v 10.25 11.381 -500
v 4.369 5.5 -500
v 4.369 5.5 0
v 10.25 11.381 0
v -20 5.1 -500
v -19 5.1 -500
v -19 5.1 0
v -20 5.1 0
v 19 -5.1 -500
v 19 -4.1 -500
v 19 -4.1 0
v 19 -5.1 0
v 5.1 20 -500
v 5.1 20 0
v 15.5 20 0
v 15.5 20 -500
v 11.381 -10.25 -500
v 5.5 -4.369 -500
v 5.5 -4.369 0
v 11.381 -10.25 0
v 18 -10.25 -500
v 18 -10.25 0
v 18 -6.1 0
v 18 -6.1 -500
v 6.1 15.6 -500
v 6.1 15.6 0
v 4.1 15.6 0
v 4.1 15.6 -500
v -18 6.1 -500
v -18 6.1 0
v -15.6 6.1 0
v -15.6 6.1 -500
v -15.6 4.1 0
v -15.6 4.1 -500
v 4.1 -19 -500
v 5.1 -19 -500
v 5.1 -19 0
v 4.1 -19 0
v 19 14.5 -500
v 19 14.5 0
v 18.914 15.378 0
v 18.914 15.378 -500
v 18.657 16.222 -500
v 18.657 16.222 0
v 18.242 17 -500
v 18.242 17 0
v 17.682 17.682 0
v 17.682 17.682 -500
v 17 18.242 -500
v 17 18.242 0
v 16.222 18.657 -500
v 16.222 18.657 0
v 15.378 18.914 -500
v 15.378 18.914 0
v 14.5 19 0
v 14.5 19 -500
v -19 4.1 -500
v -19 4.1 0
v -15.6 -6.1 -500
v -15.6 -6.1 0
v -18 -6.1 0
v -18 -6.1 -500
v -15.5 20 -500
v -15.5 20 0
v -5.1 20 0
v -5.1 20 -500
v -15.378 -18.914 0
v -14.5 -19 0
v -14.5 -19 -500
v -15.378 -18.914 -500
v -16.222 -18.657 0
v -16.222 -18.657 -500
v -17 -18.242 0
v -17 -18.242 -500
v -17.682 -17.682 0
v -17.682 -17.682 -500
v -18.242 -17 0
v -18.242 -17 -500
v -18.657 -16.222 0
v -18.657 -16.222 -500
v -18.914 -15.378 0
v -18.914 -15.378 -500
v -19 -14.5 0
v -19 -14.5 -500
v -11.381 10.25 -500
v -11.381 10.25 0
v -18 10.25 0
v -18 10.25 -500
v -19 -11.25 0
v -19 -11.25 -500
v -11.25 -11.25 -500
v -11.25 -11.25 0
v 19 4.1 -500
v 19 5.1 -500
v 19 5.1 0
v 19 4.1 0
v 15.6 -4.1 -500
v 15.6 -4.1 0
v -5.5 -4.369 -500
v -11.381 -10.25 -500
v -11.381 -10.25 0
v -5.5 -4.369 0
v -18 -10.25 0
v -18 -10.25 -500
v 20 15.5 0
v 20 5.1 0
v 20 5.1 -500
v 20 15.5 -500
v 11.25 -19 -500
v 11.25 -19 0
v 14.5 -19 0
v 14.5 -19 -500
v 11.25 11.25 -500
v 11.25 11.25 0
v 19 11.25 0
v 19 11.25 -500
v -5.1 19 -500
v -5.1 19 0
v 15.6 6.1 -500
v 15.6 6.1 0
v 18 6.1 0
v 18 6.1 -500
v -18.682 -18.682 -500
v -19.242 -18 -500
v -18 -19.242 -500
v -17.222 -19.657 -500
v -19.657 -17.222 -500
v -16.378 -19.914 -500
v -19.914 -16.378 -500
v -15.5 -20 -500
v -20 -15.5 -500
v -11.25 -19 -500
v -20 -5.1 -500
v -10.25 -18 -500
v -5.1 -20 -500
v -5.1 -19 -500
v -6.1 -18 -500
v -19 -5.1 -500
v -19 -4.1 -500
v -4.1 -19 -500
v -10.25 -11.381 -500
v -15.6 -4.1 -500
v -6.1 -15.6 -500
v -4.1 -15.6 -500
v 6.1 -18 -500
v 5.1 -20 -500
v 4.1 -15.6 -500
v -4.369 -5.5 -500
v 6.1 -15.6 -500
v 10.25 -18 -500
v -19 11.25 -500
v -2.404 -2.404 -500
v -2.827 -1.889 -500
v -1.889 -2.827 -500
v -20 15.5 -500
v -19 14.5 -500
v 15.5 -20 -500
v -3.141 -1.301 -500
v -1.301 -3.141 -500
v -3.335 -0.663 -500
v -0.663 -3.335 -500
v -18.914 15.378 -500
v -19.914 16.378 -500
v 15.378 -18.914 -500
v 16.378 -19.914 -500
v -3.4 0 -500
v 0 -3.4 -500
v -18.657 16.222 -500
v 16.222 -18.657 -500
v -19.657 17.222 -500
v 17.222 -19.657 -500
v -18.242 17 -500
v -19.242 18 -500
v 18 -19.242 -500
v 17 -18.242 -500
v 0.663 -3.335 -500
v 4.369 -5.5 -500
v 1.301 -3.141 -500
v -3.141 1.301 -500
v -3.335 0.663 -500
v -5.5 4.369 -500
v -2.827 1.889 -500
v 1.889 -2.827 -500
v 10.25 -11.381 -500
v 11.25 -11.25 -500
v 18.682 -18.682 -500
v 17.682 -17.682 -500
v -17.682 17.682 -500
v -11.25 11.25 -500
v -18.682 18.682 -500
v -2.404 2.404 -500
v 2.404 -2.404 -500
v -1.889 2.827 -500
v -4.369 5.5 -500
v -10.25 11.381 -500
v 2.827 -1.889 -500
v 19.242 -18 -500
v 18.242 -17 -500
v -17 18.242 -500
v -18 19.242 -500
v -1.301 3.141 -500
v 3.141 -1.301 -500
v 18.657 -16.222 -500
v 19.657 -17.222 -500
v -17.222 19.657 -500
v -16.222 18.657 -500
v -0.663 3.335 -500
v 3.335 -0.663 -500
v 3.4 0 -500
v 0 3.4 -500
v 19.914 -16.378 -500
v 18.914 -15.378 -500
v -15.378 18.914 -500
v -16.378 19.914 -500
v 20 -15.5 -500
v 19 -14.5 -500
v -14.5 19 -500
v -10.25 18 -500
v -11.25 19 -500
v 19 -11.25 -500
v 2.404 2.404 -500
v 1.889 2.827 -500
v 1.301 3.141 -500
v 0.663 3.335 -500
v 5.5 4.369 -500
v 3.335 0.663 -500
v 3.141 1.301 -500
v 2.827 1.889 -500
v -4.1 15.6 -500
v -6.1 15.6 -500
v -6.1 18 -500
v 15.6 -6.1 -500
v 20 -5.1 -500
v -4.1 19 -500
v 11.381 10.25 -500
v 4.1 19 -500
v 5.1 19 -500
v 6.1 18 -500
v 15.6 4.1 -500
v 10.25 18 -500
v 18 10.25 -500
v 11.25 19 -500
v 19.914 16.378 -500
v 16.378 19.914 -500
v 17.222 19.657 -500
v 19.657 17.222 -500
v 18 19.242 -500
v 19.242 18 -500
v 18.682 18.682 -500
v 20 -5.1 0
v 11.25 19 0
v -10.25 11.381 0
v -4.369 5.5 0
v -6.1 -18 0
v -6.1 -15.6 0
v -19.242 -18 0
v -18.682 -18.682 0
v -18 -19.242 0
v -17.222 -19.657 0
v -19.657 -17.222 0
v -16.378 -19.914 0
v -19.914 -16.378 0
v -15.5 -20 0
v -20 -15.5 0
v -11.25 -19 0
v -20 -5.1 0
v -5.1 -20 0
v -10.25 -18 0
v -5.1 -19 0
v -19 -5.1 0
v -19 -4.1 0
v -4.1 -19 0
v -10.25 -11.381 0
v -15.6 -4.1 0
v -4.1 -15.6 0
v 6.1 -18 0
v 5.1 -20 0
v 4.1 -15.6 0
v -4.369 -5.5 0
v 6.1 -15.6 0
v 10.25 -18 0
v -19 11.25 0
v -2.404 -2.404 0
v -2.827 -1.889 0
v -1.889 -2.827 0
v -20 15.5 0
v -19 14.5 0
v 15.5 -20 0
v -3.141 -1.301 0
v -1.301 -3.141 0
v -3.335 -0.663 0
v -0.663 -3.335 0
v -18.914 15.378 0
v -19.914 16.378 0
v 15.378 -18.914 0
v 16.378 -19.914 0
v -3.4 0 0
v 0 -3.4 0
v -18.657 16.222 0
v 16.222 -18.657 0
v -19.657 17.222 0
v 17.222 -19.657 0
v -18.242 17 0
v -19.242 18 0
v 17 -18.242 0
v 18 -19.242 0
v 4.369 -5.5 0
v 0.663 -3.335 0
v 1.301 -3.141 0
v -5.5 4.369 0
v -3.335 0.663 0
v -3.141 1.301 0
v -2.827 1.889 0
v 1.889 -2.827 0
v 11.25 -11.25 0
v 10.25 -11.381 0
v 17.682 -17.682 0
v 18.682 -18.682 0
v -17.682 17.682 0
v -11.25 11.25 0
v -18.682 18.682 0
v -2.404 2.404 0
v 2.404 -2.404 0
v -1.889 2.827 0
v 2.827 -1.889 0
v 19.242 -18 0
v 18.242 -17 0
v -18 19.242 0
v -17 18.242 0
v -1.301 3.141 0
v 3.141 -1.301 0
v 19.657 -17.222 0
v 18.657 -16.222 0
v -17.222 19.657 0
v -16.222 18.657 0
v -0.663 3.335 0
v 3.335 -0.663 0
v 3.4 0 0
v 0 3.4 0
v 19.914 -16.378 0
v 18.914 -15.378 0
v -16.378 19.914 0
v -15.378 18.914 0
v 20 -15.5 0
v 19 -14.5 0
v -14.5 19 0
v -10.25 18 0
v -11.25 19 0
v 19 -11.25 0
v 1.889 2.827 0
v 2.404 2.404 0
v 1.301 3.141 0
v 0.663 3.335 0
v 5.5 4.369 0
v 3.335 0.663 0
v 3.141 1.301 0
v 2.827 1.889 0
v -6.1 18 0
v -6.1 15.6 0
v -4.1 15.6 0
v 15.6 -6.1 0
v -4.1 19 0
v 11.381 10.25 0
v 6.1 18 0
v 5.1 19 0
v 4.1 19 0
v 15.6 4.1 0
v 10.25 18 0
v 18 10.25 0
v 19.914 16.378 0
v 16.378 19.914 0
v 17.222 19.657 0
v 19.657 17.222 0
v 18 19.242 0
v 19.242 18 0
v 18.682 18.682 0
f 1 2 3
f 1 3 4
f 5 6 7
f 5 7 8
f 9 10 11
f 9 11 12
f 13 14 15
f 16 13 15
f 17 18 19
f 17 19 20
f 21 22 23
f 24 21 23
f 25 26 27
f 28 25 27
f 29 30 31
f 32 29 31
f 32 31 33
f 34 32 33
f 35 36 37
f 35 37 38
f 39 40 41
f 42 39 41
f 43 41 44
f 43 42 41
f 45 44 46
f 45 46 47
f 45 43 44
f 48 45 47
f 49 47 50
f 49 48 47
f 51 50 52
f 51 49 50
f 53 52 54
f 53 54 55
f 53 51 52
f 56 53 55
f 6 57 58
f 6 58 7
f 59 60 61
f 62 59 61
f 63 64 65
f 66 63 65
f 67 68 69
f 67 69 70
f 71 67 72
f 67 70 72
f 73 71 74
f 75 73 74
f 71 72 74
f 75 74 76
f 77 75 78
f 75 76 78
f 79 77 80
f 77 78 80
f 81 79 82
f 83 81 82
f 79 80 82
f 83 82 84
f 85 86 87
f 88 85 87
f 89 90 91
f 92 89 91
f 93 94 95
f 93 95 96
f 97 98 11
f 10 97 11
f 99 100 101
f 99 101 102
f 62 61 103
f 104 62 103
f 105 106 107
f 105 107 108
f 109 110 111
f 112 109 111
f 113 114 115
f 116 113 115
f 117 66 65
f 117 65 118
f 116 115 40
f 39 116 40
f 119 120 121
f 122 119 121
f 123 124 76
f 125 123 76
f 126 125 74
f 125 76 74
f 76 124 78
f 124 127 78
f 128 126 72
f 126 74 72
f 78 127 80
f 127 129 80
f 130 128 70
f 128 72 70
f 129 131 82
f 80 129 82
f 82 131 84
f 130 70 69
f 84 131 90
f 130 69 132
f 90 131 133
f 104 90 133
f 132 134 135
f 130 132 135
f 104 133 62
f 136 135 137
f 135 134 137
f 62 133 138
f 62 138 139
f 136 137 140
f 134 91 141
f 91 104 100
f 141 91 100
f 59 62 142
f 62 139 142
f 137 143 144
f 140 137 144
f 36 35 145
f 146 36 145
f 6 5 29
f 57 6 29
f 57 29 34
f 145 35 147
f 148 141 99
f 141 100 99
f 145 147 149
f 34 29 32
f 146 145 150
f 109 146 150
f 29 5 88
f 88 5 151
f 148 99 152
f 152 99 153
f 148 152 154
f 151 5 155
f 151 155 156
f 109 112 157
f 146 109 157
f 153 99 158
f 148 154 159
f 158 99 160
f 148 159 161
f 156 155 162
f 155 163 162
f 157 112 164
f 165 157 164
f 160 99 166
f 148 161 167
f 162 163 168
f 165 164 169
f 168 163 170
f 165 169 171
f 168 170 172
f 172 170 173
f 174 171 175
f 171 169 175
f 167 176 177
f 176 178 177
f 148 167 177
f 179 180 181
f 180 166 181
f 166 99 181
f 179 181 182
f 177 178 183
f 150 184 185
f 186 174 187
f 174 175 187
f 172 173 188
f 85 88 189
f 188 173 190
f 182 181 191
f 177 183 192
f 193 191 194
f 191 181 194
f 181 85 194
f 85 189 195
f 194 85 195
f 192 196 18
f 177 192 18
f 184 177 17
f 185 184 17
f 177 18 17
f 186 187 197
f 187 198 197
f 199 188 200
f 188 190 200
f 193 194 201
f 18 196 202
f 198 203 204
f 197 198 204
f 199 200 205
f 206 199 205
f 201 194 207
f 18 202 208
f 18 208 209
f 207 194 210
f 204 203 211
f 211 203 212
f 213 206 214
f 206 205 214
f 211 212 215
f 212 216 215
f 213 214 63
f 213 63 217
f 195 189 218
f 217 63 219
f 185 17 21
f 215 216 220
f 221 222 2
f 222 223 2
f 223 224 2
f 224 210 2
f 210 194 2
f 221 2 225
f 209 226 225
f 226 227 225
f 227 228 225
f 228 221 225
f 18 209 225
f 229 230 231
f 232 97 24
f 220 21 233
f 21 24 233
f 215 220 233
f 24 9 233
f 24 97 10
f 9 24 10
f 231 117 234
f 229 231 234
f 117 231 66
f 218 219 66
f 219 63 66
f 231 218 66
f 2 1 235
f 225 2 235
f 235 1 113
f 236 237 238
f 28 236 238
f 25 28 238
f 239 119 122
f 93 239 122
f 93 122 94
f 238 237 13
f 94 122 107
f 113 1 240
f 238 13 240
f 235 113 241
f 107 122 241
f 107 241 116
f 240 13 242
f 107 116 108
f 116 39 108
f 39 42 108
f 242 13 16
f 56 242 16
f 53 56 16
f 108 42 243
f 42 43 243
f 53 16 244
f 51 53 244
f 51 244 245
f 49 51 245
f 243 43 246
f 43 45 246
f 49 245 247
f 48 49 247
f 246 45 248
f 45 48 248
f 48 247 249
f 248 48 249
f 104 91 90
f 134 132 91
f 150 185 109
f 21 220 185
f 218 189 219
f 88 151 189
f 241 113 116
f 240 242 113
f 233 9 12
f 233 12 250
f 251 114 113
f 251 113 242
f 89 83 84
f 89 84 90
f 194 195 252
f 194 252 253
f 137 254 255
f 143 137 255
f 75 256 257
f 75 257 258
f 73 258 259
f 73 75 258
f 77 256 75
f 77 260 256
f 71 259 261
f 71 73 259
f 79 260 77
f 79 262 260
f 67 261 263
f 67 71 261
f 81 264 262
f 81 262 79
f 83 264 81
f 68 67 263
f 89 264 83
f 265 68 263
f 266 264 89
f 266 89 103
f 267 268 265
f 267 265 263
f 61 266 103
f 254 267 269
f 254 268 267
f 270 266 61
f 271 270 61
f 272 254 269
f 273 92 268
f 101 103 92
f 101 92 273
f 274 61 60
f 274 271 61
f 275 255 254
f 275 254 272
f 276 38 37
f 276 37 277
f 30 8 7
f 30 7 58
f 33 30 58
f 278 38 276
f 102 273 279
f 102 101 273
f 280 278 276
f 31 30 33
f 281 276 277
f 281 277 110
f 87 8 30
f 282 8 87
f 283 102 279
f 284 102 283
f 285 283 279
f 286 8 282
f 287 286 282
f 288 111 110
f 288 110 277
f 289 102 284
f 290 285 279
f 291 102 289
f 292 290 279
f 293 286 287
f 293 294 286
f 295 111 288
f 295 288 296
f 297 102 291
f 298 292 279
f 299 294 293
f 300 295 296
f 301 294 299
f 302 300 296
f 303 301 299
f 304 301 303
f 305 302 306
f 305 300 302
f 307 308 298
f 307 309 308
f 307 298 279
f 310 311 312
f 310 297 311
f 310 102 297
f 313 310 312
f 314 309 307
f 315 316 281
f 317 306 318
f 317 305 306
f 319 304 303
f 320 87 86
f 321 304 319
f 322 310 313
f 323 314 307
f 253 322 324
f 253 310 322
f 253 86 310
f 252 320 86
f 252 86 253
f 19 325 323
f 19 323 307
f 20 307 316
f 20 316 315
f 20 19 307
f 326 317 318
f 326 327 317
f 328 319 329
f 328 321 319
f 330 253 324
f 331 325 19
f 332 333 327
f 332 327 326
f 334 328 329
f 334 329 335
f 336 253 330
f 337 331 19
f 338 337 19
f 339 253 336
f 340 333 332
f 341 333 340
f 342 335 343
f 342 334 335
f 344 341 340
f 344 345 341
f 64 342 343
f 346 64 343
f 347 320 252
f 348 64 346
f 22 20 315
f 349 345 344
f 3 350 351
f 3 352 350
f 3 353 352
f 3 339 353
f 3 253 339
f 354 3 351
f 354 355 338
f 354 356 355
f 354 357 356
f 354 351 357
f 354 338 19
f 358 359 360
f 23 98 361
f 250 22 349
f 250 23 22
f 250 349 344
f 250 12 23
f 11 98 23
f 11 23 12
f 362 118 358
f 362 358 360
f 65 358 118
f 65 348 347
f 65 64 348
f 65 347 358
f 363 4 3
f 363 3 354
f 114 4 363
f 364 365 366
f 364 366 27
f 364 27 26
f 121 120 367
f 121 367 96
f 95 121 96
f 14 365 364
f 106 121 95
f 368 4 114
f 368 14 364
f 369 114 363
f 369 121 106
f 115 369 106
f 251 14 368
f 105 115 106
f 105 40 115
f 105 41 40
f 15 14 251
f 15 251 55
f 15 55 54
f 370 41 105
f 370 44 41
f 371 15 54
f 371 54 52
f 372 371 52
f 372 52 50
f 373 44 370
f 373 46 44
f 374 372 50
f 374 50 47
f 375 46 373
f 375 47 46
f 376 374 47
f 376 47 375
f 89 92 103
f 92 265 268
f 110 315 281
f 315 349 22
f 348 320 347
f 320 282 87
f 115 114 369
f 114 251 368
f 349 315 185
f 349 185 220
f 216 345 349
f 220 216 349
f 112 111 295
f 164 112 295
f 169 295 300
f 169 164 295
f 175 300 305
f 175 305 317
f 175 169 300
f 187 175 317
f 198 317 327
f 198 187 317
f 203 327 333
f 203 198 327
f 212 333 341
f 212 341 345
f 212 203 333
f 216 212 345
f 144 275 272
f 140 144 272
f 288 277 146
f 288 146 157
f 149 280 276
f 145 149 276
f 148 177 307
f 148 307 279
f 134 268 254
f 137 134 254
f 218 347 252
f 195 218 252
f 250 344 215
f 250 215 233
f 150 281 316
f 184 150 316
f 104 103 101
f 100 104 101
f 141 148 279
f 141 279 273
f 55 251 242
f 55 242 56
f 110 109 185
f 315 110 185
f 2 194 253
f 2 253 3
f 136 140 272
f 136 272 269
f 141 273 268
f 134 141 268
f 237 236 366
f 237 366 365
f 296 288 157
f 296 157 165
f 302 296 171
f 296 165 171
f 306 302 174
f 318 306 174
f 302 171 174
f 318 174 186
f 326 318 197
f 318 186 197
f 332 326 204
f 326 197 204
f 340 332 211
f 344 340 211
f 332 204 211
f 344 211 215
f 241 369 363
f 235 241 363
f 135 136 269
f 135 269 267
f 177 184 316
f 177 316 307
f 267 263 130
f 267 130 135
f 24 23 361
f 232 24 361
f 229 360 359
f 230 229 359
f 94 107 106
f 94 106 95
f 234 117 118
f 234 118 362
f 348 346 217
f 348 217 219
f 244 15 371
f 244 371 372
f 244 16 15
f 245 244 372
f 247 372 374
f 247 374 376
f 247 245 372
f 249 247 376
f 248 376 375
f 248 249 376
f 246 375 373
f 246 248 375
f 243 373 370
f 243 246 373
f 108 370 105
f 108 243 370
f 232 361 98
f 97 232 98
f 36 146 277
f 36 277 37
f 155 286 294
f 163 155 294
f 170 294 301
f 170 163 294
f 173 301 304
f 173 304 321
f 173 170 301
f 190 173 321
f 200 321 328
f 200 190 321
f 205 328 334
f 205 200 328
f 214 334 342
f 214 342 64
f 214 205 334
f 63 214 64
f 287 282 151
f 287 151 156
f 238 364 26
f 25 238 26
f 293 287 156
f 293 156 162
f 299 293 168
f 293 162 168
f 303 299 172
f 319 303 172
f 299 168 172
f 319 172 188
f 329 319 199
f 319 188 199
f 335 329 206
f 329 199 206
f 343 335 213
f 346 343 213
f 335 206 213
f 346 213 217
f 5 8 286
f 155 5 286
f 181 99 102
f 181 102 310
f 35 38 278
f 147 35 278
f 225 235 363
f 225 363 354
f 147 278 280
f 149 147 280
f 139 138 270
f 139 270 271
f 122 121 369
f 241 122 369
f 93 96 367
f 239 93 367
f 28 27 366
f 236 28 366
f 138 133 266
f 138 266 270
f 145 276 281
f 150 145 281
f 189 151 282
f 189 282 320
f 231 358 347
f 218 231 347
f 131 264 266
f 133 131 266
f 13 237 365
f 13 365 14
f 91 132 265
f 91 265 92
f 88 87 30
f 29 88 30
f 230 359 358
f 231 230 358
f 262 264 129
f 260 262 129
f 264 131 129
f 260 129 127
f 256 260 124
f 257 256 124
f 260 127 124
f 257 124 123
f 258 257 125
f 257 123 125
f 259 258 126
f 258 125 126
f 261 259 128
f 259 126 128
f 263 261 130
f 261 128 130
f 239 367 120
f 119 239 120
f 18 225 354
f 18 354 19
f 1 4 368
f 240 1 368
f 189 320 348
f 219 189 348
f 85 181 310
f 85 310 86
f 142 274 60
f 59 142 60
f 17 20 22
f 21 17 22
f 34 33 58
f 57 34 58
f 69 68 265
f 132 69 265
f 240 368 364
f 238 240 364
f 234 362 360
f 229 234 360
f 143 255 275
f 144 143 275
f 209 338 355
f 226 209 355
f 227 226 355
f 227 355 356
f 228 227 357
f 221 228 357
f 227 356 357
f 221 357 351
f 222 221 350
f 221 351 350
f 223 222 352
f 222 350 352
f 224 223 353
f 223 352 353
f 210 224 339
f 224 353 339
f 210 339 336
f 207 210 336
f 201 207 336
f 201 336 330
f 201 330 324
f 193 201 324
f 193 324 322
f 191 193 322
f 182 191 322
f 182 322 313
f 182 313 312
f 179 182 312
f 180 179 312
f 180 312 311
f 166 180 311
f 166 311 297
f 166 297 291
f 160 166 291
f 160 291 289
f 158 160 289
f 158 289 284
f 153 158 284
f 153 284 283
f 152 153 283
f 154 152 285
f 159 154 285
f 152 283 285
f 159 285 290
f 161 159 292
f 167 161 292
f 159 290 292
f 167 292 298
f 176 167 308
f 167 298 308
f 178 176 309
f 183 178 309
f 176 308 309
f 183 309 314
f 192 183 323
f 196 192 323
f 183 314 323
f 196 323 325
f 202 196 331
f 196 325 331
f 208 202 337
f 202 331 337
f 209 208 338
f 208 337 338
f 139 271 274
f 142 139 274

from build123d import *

# Parameters (mm, degrees)
SKETCH_1_W          = 40
SKETCH_1_H          = 40
EXTRUDE_1_DEPTH     = 500
CUT_EXTRUDE_1_DEPTH = 501
SKETCH_3_W          = 7.75
SKETCH_3_H          = 7.75
CUT_EXTRUDE_2_DEPTH = 501
SKETCH_4_R          = 3.4
CUT_EXTRUDE_3_DEPTH = 501
FILLET_1_R          = 4.5


with BuildPart() as part:
    # 草图1 → 凸台-拉伸1 (new body)
    with BuildSketch(Plane.XY):
        Rectangle(SKETCH_1_W, SKETCH_1_H)
    extrude(amount=-EXTRUDE_1_DEPTH)

    # 草图2 → 切除-拉伸1 (cut, through all)
    with BuildSketch(Plane.XY):
        Polygon((-19, 5.1), (-20, 5.1), (-20, -5.1), (-19, -5.1), (-19, -4.1), (-15.6, -4.1), (-15.6, -6.1), (-18, -6.1), (-18, -10.25), (-11.38137085, -10.25), (-5.5, -4.36862915), (-5.5, 4.36862915), (-11.38137085, 10.25), (-18, 10.25), (-18, 6.1), (-15.6, 6.1), (-15.6, 4.1), (-19, 4.1), align=None)
        Polygon((-5.1, -19), (-5.1, -20), (5.1, -20), (5.1, -19), (4.1, -19), (4.1, -15.6), (6.1, -15.6), (6.1, -18), (10.25, -18), (10.25, -11.38137085), (4.36862915, -5.5), (-4.36862915, -5.5), (-10.25, -11.38137085), (-10.25, -18), (-6.1, -18), (-6.1, -15.6), (-4.1, -15.6), (-4.1, -19), align=None)
        Polygon((20, -5.1), (20, 5.1), (19, 5.1), (19, 4.1), (15.6, 4.1), (15.6, 6.1), (18, 6.1), (18, 10.25), (11.38137085, 10.25), (5.5, 4.36862915), (5.5, -4.36862915), (11.38137085, -10.25), (18, -10.25), (18, -6.1), (15.6, -6.1), (15.6, -4.1), (19, -4.1), (19, -5.1), align=None)
        Polygon((5.1, 20), (-5.1, 20), (-5.1, 19), (-4.1, 19), (-4.1, 15.6), (-6.1, 15.6), (-6.1, 18), (-10.25, 18), (-10.25, 11.38137085), (-4.36862915, 5.5), (4.36862915, 5.5), (10.25, 11.38137085), (10.25, 18), (6.1, 18), (6.1, 15.6), (4.1, 15.6), (4.1, 19), (5.1, 19), align=None)
    extrude(amount=-CUT_EXTRUDE_1_DEPTH, mode=Mode.SUBTRACT)

    # 草图3 → 切除-拉伸2 (cut, through all)
    with BuildSketch(Plane.XY):
        with Locations((-15.125, 15.125)):
            Rectangle(SKETCH_3_W, SKETCH_3_H)
        with Locations((15.125, 15.125)):
            Rectangle(SKETCH_3_W, SKETCH_3_H)
        with Locations((15.125, -15.125)):
            Rectangle(SKETCH_3_W, SKETCH_3_H)
        with Locations((-15.125, -15.125)):
            Rectangle(SKETCH_3_W, SKETCH_3_H)
    extrude(amount=-CUT_EXTRUDE_2_DEPTH, mode=Mode.SUBTRACT)

    # 草图4 → 切除-拉伸3 (cut, through all)
    with BuildSketch(Plane.XY):
        Circle(SKETCH_4_R)
    extrude(amount=-CUT_EXTRUDE_3_DEPTH, mode=Mode.SUBTRACT)

    # 圆角1
    fillet_1_edges = [part.edges().sort_by_distance(p)[0] for p in [
        (-19, -19, -250),
        (19, -19, -250),
        (19, 19, -250),
        (-19, 19, -250),
        (20, -20, -250),
        (-20, -20, -250),
        (-20, 20, -250),
        (20, 20, -250),
    ]]
    fillet(fillet_1_edges, radius=FILLET_1_R)


solid = part.part
